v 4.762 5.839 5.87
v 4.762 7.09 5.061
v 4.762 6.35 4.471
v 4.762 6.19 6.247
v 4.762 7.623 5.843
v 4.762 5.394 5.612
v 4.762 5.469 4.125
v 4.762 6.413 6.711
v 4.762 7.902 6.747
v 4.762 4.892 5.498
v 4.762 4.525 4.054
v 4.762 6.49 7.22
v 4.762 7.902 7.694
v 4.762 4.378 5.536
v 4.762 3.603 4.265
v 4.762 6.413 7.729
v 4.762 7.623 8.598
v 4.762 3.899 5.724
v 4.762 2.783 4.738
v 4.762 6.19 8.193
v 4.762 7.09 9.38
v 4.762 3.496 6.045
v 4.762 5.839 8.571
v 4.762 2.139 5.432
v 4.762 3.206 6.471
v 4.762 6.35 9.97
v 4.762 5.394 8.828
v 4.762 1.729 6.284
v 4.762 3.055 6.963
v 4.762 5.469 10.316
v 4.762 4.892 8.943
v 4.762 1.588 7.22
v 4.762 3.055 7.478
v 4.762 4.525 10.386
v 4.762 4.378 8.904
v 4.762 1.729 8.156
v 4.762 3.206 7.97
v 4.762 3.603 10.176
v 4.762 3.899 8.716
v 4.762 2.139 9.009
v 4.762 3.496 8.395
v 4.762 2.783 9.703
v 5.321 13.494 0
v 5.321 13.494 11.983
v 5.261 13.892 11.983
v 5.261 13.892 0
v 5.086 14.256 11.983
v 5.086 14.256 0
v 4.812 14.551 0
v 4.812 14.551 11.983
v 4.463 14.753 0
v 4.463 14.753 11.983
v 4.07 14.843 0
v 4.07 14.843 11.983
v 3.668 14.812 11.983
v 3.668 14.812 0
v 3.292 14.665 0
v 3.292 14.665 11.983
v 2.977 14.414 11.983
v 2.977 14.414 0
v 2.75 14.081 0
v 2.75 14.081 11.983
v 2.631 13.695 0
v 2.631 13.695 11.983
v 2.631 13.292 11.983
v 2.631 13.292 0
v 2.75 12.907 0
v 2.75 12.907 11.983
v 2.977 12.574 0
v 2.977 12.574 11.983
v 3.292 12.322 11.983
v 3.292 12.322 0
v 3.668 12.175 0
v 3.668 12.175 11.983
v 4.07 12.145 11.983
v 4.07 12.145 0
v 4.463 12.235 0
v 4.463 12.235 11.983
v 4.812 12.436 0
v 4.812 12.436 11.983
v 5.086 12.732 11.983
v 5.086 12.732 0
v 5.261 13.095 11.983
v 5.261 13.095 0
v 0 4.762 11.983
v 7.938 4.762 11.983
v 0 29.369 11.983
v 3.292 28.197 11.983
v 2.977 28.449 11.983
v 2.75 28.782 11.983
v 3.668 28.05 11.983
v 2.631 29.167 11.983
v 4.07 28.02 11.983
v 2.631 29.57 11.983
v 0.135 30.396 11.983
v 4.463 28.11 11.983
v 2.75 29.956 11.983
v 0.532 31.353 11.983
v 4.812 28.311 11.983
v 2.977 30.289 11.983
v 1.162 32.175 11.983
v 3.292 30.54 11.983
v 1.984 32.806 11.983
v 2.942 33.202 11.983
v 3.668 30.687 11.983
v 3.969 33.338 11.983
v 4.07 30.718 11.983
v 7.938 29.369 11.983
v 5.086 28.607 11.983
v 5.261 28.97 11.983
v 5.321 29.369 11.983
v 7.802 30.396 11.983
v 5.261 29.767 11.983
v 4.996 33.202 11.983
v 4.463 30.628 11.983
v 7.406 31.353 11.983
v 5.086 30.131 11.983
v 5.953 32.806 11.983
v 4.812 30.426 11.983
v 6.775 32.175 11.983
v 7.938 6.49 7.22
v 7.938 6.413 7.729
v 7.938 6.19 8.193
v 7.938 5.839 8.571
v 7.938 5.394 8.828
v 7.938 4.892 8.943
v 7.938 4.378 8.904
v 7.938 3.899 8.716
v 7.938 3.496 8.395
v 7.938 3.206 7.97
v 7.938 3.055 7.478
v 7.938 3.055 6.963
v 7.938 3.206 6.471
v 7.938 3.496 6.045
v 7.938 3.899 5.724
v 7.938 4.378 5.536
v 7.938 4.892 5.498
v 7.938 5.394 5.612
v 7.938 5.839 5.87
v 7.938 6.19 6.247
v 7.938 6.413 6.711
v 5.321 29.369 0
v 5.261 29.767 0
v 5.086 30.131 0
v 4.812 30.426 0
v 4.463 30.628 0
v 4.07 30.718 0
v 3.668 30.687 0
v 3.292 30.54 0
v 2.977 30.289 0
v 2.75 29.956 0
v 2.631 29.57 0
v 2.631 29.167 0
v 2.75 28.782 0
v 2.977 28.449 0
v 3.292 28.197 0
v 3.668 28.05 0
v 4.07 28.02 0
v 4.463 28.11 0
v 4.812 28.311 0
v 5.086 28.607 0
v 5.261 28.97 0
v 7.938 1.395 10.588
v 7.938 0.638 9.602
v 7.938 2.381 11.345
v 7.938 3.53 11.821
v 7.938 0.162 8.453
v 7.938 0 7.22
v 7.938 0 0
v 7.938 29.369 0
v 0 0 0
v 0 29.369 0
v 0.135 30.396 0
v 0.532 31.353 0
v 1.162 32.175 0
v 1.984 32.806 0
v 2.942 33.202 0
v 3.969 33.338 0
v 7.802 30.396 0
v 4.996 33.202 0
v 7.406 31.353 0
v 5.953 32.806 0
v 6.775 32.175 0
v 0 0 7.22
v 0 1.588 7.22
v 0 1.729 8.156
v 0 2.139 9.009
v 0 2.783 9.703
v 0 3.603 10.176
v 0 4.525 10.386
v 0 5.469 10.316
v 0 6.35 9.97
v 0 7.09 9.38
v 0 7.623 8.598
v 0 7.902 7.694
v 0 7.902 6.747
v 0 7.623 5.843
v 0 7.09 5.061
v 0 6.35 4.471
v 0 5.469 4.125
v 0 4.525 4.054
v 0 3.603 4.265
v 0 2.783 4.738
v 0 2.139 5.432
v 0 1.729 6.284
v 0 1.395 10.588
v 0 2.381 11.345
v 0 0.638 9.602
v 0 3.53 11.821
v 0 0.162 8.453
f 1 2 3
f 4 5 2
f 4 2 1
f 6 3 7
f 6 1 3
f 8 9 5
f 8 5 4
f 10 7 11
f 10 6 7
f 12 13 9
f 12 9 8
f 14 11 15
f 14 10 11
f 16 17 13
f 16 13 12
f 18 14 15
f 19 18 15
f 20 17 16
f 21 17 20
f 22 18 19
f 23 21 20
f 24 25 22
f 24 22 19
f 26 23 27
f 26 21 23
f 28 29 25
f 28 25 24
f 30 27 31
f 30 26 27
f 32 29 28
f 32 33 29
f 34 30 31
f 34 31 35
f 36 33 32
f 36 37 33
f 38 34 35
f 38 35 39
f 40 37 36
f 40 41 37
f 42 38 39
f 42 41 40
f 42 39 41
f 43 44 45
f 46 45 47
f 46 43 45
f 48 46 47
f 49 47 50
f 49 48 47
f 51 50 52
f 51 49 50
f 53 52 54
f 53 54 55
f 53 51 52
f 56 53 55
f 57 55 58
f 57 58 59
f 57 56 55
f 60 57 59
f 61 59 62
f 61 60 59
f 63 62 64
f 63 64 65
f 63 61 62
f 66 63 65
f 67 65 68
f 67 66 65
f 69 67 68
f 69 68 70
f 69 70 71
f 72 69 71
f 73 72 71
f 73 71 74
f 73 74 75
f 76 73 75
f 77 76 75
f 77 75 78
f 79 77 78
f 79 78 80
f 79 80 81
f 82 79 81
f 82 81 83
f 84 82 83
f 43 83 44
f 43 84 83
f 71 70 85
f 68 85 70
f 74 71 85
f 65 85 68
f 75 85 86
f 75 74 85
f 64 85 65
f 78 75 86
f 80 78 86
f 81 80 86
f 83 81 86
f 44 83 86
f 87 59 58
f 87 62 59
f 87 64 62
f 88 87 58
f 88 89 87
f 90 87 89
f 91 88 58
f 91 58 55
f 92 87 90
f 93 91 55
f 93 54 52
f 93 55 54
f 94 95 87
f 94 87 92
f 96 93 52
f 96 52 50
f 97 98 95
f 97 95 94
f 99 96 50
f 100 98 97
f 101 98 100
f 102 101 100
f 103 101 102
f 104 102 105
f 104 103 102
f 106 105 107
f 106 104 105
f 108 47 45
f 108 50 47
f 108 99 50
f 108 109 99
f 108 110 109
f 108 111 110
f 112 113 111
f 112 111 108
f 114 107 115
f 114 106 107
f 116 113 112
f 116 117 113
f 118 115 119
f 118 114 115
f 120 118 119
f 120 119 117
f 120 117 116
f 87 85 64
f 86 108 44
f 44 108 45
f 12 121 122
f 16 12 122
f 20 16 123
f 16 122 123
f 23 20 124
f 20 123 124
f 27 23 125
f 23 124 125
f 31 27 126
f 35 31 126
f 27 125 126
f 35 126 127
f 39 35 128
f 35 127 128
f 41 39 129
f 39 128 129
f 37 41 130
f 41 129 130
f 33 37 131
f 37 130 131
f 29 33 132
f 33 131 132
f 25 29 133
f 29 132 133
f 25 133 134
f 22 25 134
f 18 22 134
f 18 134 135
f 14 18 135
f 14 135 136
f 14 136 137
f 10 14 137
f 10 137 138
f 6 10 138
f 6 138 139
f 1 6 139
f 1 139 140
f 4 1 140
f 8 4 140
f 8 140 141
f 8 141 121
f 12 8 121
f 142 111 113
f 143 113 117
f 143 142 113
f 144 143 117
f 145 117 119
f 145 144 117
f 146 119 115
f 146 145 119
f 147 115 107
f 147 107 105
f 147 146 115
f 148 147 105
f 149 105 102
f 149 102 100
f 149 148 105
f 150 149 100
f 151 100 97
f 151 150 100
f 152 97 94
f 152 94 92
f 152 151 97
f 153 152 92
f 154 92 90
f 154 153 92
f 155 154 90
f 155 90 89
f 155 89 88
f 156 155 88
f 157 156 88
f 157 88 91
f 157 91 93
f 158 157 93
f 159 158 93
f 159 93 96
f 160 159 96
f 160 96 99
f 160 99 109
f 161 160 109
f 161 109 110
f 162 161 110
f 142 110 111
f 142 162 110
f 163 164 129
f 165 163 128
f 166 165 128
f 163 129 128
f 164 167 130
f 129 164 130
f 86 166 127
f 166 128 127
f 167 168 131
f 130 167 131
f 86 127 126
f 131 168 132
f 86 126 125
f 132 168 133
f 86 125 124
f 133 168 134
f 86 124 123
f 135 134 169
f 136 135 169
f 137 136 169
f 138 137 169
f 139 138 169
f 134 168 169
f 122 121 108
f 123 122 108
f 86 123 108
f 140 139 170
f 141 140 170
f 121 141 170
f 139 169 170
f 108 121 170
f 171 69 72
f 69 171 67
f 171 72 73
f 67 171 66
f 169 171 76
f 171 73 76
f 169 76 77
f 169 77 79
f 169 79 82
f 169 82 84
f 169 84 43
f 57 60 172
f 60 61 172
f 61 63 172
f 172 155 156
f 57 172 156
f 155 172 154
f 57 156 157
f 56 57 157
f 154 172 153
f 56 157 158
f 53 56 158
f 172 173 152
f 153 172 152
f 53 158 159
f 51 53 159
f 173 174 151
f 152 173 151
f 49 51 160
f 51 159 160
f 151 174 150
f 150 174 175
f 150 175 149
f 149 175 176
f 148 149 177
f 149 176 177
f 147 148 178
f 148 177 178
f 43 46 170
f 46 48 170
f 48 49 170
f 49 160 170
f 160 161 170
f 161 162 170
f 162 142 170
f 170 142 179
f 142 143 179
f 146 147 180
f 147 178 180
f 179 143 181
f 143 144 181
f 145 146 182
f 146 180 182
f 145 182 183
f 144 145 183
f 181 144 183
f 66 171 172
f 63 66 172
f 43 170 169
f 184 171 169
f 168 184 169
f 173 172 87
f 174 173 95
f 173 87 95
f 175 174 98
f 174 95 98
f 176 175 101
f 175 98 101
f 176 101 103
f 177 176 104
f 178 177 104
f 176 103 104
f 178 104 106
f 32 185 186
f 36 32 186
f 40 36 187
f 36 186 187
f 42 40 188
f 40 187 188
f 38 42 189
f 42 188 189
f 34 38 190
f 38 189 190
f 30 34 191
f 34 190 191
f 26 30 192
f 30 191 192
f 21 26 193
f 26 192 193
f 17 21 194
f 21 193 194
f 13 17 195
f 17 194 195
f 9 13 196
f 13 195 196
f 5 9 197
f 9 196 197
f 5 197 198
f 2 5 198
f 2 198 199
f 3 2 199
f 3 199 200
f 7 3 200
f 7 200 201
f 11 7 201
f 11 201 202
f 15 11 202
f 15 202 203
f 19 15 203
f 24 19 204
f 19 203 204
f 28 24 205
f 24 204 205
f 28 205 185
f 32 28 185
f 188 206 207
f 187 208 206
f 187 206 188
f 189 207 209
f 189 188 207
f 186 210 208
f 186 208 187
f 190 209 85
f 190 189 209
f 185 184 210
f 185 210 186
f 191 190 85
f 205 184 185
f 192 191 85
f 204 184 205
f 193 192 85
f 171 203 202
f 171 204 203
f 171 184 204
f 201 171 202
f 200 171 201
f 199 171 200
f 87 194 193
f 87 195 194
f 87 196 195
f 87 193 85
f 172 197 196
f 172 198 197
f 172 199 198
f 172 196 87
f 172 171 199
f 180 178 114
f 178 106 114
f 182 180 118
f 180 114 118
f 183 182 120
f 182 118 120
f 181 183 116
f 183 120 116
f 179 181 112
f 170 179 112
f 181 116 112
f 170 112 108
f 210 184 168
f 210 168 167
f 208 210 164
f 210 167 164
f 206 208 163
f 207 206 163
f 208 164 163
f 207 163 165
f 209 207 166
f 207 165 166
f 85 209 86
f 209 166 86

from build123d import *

# Parameters (mm, degrees)
F0_W     = 7.9375
F0_H     = 33.3375
F0_R     = 1.35255
F1_DEPTH = 11.9827929
F2_R     = 3.96874
F3_R     = 4.7625
F4_R     = 1.7272
F5_DEPTH = 7.9375
F6_R     = 3.175
F6_R_2   = 1.7272
F8_DEPTH = 4.7625


# Not quite as in the source:
# - a fillet or chamfer is up to 0.001 mm smaller than in the source, because OpenCascade refuses the exact size


with BuildPart() as f1:
    # F0 (on Top) → F1 (new body)
    with BuildSketch(Plane.XY):
        with Locations((3.96875, 16.66875)):
            Rectangle(F0_W, F0_H)
        with Locations((3.96875, 13.49375)):
            Circle(F0_R, mode=Mode.SUBTRACT)
        with Locations((3.96875, 29.36875)):
            Circle(F0_R, mode=Mode.SUBTRACT)
    extrude(amount=F1_DEPTH)

    # F2 (radius 3.96875 in the source; OpenCascade refuses exactly that, so slightly less here)
    f2_edges = [f1.edges().sort_by_distance(p)[0] for p in [
        (7.9375, 33.3375, 5.991396),
        (0, 33.3375, 5.991396),
    ]]
    fillet(f2_edges, radius=F2_R)

    # F3
    f3_edges = [f1.edges().sort_by_distance(p)[0] for p in [
        (3.96875, 0, 11.982793),
    ]]
    fillet(f3_edges, radius=F3_R)

    # F4 (on face) → F5 (cut, through all)
    with BuildSketch(Plane.YZ.offset(7.9375)):
        with Locations((4.7625, 7.2202929)):
            Circle(F4_R)
    extrude(amount=-F5_DEPTH, mode=Mode.SUBTRACT)

    # F6 (on face) → F8 (cut, through all)
    with BuildSketch(Plane(origin=(0, 0, 0), x_dir=(0, -1, 0), z_dir=(-1, 0, 0))):
        with Locations((-4.7625, 7.2202929)):
            Circle(F6_R)
        with Locations((-4.7625, 7.2202929)):
            Circle(F6_R_2, mode=Mode.SUBTRACT)
    extrude(amount=-F8_DEPTH, mode=Mode.SUBTRACT)


solid = f1.part
